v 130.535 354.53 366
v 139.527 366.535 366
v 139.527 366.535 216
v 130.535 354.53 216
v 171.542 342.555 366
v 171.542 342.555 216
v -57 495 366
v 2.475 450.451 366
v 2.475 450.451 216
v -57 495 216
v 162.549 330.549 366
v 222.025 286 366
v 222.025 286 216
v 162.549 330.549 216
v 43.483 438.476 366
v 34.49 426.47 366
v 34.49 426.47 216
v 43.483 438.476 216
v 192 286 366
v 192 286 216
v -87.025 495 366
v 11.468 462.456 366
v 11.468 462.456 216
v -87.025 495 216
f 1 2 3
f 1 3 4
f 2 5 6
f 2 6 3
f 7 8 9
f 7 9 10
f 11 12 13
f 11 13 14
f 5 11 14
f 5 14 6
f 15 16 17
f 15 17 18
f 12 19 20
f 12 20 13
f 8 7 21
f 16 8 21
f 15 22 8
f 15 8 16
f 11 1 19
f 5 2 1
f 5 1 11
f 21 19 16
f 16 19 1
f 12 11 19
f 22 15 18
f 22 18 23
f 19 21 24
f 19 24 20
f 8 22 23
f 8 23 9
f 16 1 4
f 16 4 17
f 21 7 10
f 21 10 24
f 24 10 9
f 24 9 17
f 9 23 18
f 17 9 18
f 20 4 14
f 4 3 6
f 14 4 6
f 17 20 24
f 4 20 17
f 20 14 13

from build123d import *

# Parameters (mm, degrees)
EXTRUDE_1_DEPTH = 150


with BuildPart() as part:
    # 草图1 → 凸台-拉伸1 (new body)
    with BuildSketch(Plane.XY.offset(366)):
        Polygon((-87.024672103, 495), (192, 286), (222.024672103, 286), (-57, 495), align=None)
        Polygon((2.475382036, 450.450696342), (34.490163642, 426.470417805), (43.482768093, 438.475960908), (11.467986487, 462.456239445), align=None)
        Polygon((130.534508461, 354.529582195), (162.549290067, 330.549303658), (171.541894518, 342.55484676), (139.527112912, 366.535125297), align=None)
    extrude(amount=-EXTRUDE_1_DEPTH)


solid = part.part
